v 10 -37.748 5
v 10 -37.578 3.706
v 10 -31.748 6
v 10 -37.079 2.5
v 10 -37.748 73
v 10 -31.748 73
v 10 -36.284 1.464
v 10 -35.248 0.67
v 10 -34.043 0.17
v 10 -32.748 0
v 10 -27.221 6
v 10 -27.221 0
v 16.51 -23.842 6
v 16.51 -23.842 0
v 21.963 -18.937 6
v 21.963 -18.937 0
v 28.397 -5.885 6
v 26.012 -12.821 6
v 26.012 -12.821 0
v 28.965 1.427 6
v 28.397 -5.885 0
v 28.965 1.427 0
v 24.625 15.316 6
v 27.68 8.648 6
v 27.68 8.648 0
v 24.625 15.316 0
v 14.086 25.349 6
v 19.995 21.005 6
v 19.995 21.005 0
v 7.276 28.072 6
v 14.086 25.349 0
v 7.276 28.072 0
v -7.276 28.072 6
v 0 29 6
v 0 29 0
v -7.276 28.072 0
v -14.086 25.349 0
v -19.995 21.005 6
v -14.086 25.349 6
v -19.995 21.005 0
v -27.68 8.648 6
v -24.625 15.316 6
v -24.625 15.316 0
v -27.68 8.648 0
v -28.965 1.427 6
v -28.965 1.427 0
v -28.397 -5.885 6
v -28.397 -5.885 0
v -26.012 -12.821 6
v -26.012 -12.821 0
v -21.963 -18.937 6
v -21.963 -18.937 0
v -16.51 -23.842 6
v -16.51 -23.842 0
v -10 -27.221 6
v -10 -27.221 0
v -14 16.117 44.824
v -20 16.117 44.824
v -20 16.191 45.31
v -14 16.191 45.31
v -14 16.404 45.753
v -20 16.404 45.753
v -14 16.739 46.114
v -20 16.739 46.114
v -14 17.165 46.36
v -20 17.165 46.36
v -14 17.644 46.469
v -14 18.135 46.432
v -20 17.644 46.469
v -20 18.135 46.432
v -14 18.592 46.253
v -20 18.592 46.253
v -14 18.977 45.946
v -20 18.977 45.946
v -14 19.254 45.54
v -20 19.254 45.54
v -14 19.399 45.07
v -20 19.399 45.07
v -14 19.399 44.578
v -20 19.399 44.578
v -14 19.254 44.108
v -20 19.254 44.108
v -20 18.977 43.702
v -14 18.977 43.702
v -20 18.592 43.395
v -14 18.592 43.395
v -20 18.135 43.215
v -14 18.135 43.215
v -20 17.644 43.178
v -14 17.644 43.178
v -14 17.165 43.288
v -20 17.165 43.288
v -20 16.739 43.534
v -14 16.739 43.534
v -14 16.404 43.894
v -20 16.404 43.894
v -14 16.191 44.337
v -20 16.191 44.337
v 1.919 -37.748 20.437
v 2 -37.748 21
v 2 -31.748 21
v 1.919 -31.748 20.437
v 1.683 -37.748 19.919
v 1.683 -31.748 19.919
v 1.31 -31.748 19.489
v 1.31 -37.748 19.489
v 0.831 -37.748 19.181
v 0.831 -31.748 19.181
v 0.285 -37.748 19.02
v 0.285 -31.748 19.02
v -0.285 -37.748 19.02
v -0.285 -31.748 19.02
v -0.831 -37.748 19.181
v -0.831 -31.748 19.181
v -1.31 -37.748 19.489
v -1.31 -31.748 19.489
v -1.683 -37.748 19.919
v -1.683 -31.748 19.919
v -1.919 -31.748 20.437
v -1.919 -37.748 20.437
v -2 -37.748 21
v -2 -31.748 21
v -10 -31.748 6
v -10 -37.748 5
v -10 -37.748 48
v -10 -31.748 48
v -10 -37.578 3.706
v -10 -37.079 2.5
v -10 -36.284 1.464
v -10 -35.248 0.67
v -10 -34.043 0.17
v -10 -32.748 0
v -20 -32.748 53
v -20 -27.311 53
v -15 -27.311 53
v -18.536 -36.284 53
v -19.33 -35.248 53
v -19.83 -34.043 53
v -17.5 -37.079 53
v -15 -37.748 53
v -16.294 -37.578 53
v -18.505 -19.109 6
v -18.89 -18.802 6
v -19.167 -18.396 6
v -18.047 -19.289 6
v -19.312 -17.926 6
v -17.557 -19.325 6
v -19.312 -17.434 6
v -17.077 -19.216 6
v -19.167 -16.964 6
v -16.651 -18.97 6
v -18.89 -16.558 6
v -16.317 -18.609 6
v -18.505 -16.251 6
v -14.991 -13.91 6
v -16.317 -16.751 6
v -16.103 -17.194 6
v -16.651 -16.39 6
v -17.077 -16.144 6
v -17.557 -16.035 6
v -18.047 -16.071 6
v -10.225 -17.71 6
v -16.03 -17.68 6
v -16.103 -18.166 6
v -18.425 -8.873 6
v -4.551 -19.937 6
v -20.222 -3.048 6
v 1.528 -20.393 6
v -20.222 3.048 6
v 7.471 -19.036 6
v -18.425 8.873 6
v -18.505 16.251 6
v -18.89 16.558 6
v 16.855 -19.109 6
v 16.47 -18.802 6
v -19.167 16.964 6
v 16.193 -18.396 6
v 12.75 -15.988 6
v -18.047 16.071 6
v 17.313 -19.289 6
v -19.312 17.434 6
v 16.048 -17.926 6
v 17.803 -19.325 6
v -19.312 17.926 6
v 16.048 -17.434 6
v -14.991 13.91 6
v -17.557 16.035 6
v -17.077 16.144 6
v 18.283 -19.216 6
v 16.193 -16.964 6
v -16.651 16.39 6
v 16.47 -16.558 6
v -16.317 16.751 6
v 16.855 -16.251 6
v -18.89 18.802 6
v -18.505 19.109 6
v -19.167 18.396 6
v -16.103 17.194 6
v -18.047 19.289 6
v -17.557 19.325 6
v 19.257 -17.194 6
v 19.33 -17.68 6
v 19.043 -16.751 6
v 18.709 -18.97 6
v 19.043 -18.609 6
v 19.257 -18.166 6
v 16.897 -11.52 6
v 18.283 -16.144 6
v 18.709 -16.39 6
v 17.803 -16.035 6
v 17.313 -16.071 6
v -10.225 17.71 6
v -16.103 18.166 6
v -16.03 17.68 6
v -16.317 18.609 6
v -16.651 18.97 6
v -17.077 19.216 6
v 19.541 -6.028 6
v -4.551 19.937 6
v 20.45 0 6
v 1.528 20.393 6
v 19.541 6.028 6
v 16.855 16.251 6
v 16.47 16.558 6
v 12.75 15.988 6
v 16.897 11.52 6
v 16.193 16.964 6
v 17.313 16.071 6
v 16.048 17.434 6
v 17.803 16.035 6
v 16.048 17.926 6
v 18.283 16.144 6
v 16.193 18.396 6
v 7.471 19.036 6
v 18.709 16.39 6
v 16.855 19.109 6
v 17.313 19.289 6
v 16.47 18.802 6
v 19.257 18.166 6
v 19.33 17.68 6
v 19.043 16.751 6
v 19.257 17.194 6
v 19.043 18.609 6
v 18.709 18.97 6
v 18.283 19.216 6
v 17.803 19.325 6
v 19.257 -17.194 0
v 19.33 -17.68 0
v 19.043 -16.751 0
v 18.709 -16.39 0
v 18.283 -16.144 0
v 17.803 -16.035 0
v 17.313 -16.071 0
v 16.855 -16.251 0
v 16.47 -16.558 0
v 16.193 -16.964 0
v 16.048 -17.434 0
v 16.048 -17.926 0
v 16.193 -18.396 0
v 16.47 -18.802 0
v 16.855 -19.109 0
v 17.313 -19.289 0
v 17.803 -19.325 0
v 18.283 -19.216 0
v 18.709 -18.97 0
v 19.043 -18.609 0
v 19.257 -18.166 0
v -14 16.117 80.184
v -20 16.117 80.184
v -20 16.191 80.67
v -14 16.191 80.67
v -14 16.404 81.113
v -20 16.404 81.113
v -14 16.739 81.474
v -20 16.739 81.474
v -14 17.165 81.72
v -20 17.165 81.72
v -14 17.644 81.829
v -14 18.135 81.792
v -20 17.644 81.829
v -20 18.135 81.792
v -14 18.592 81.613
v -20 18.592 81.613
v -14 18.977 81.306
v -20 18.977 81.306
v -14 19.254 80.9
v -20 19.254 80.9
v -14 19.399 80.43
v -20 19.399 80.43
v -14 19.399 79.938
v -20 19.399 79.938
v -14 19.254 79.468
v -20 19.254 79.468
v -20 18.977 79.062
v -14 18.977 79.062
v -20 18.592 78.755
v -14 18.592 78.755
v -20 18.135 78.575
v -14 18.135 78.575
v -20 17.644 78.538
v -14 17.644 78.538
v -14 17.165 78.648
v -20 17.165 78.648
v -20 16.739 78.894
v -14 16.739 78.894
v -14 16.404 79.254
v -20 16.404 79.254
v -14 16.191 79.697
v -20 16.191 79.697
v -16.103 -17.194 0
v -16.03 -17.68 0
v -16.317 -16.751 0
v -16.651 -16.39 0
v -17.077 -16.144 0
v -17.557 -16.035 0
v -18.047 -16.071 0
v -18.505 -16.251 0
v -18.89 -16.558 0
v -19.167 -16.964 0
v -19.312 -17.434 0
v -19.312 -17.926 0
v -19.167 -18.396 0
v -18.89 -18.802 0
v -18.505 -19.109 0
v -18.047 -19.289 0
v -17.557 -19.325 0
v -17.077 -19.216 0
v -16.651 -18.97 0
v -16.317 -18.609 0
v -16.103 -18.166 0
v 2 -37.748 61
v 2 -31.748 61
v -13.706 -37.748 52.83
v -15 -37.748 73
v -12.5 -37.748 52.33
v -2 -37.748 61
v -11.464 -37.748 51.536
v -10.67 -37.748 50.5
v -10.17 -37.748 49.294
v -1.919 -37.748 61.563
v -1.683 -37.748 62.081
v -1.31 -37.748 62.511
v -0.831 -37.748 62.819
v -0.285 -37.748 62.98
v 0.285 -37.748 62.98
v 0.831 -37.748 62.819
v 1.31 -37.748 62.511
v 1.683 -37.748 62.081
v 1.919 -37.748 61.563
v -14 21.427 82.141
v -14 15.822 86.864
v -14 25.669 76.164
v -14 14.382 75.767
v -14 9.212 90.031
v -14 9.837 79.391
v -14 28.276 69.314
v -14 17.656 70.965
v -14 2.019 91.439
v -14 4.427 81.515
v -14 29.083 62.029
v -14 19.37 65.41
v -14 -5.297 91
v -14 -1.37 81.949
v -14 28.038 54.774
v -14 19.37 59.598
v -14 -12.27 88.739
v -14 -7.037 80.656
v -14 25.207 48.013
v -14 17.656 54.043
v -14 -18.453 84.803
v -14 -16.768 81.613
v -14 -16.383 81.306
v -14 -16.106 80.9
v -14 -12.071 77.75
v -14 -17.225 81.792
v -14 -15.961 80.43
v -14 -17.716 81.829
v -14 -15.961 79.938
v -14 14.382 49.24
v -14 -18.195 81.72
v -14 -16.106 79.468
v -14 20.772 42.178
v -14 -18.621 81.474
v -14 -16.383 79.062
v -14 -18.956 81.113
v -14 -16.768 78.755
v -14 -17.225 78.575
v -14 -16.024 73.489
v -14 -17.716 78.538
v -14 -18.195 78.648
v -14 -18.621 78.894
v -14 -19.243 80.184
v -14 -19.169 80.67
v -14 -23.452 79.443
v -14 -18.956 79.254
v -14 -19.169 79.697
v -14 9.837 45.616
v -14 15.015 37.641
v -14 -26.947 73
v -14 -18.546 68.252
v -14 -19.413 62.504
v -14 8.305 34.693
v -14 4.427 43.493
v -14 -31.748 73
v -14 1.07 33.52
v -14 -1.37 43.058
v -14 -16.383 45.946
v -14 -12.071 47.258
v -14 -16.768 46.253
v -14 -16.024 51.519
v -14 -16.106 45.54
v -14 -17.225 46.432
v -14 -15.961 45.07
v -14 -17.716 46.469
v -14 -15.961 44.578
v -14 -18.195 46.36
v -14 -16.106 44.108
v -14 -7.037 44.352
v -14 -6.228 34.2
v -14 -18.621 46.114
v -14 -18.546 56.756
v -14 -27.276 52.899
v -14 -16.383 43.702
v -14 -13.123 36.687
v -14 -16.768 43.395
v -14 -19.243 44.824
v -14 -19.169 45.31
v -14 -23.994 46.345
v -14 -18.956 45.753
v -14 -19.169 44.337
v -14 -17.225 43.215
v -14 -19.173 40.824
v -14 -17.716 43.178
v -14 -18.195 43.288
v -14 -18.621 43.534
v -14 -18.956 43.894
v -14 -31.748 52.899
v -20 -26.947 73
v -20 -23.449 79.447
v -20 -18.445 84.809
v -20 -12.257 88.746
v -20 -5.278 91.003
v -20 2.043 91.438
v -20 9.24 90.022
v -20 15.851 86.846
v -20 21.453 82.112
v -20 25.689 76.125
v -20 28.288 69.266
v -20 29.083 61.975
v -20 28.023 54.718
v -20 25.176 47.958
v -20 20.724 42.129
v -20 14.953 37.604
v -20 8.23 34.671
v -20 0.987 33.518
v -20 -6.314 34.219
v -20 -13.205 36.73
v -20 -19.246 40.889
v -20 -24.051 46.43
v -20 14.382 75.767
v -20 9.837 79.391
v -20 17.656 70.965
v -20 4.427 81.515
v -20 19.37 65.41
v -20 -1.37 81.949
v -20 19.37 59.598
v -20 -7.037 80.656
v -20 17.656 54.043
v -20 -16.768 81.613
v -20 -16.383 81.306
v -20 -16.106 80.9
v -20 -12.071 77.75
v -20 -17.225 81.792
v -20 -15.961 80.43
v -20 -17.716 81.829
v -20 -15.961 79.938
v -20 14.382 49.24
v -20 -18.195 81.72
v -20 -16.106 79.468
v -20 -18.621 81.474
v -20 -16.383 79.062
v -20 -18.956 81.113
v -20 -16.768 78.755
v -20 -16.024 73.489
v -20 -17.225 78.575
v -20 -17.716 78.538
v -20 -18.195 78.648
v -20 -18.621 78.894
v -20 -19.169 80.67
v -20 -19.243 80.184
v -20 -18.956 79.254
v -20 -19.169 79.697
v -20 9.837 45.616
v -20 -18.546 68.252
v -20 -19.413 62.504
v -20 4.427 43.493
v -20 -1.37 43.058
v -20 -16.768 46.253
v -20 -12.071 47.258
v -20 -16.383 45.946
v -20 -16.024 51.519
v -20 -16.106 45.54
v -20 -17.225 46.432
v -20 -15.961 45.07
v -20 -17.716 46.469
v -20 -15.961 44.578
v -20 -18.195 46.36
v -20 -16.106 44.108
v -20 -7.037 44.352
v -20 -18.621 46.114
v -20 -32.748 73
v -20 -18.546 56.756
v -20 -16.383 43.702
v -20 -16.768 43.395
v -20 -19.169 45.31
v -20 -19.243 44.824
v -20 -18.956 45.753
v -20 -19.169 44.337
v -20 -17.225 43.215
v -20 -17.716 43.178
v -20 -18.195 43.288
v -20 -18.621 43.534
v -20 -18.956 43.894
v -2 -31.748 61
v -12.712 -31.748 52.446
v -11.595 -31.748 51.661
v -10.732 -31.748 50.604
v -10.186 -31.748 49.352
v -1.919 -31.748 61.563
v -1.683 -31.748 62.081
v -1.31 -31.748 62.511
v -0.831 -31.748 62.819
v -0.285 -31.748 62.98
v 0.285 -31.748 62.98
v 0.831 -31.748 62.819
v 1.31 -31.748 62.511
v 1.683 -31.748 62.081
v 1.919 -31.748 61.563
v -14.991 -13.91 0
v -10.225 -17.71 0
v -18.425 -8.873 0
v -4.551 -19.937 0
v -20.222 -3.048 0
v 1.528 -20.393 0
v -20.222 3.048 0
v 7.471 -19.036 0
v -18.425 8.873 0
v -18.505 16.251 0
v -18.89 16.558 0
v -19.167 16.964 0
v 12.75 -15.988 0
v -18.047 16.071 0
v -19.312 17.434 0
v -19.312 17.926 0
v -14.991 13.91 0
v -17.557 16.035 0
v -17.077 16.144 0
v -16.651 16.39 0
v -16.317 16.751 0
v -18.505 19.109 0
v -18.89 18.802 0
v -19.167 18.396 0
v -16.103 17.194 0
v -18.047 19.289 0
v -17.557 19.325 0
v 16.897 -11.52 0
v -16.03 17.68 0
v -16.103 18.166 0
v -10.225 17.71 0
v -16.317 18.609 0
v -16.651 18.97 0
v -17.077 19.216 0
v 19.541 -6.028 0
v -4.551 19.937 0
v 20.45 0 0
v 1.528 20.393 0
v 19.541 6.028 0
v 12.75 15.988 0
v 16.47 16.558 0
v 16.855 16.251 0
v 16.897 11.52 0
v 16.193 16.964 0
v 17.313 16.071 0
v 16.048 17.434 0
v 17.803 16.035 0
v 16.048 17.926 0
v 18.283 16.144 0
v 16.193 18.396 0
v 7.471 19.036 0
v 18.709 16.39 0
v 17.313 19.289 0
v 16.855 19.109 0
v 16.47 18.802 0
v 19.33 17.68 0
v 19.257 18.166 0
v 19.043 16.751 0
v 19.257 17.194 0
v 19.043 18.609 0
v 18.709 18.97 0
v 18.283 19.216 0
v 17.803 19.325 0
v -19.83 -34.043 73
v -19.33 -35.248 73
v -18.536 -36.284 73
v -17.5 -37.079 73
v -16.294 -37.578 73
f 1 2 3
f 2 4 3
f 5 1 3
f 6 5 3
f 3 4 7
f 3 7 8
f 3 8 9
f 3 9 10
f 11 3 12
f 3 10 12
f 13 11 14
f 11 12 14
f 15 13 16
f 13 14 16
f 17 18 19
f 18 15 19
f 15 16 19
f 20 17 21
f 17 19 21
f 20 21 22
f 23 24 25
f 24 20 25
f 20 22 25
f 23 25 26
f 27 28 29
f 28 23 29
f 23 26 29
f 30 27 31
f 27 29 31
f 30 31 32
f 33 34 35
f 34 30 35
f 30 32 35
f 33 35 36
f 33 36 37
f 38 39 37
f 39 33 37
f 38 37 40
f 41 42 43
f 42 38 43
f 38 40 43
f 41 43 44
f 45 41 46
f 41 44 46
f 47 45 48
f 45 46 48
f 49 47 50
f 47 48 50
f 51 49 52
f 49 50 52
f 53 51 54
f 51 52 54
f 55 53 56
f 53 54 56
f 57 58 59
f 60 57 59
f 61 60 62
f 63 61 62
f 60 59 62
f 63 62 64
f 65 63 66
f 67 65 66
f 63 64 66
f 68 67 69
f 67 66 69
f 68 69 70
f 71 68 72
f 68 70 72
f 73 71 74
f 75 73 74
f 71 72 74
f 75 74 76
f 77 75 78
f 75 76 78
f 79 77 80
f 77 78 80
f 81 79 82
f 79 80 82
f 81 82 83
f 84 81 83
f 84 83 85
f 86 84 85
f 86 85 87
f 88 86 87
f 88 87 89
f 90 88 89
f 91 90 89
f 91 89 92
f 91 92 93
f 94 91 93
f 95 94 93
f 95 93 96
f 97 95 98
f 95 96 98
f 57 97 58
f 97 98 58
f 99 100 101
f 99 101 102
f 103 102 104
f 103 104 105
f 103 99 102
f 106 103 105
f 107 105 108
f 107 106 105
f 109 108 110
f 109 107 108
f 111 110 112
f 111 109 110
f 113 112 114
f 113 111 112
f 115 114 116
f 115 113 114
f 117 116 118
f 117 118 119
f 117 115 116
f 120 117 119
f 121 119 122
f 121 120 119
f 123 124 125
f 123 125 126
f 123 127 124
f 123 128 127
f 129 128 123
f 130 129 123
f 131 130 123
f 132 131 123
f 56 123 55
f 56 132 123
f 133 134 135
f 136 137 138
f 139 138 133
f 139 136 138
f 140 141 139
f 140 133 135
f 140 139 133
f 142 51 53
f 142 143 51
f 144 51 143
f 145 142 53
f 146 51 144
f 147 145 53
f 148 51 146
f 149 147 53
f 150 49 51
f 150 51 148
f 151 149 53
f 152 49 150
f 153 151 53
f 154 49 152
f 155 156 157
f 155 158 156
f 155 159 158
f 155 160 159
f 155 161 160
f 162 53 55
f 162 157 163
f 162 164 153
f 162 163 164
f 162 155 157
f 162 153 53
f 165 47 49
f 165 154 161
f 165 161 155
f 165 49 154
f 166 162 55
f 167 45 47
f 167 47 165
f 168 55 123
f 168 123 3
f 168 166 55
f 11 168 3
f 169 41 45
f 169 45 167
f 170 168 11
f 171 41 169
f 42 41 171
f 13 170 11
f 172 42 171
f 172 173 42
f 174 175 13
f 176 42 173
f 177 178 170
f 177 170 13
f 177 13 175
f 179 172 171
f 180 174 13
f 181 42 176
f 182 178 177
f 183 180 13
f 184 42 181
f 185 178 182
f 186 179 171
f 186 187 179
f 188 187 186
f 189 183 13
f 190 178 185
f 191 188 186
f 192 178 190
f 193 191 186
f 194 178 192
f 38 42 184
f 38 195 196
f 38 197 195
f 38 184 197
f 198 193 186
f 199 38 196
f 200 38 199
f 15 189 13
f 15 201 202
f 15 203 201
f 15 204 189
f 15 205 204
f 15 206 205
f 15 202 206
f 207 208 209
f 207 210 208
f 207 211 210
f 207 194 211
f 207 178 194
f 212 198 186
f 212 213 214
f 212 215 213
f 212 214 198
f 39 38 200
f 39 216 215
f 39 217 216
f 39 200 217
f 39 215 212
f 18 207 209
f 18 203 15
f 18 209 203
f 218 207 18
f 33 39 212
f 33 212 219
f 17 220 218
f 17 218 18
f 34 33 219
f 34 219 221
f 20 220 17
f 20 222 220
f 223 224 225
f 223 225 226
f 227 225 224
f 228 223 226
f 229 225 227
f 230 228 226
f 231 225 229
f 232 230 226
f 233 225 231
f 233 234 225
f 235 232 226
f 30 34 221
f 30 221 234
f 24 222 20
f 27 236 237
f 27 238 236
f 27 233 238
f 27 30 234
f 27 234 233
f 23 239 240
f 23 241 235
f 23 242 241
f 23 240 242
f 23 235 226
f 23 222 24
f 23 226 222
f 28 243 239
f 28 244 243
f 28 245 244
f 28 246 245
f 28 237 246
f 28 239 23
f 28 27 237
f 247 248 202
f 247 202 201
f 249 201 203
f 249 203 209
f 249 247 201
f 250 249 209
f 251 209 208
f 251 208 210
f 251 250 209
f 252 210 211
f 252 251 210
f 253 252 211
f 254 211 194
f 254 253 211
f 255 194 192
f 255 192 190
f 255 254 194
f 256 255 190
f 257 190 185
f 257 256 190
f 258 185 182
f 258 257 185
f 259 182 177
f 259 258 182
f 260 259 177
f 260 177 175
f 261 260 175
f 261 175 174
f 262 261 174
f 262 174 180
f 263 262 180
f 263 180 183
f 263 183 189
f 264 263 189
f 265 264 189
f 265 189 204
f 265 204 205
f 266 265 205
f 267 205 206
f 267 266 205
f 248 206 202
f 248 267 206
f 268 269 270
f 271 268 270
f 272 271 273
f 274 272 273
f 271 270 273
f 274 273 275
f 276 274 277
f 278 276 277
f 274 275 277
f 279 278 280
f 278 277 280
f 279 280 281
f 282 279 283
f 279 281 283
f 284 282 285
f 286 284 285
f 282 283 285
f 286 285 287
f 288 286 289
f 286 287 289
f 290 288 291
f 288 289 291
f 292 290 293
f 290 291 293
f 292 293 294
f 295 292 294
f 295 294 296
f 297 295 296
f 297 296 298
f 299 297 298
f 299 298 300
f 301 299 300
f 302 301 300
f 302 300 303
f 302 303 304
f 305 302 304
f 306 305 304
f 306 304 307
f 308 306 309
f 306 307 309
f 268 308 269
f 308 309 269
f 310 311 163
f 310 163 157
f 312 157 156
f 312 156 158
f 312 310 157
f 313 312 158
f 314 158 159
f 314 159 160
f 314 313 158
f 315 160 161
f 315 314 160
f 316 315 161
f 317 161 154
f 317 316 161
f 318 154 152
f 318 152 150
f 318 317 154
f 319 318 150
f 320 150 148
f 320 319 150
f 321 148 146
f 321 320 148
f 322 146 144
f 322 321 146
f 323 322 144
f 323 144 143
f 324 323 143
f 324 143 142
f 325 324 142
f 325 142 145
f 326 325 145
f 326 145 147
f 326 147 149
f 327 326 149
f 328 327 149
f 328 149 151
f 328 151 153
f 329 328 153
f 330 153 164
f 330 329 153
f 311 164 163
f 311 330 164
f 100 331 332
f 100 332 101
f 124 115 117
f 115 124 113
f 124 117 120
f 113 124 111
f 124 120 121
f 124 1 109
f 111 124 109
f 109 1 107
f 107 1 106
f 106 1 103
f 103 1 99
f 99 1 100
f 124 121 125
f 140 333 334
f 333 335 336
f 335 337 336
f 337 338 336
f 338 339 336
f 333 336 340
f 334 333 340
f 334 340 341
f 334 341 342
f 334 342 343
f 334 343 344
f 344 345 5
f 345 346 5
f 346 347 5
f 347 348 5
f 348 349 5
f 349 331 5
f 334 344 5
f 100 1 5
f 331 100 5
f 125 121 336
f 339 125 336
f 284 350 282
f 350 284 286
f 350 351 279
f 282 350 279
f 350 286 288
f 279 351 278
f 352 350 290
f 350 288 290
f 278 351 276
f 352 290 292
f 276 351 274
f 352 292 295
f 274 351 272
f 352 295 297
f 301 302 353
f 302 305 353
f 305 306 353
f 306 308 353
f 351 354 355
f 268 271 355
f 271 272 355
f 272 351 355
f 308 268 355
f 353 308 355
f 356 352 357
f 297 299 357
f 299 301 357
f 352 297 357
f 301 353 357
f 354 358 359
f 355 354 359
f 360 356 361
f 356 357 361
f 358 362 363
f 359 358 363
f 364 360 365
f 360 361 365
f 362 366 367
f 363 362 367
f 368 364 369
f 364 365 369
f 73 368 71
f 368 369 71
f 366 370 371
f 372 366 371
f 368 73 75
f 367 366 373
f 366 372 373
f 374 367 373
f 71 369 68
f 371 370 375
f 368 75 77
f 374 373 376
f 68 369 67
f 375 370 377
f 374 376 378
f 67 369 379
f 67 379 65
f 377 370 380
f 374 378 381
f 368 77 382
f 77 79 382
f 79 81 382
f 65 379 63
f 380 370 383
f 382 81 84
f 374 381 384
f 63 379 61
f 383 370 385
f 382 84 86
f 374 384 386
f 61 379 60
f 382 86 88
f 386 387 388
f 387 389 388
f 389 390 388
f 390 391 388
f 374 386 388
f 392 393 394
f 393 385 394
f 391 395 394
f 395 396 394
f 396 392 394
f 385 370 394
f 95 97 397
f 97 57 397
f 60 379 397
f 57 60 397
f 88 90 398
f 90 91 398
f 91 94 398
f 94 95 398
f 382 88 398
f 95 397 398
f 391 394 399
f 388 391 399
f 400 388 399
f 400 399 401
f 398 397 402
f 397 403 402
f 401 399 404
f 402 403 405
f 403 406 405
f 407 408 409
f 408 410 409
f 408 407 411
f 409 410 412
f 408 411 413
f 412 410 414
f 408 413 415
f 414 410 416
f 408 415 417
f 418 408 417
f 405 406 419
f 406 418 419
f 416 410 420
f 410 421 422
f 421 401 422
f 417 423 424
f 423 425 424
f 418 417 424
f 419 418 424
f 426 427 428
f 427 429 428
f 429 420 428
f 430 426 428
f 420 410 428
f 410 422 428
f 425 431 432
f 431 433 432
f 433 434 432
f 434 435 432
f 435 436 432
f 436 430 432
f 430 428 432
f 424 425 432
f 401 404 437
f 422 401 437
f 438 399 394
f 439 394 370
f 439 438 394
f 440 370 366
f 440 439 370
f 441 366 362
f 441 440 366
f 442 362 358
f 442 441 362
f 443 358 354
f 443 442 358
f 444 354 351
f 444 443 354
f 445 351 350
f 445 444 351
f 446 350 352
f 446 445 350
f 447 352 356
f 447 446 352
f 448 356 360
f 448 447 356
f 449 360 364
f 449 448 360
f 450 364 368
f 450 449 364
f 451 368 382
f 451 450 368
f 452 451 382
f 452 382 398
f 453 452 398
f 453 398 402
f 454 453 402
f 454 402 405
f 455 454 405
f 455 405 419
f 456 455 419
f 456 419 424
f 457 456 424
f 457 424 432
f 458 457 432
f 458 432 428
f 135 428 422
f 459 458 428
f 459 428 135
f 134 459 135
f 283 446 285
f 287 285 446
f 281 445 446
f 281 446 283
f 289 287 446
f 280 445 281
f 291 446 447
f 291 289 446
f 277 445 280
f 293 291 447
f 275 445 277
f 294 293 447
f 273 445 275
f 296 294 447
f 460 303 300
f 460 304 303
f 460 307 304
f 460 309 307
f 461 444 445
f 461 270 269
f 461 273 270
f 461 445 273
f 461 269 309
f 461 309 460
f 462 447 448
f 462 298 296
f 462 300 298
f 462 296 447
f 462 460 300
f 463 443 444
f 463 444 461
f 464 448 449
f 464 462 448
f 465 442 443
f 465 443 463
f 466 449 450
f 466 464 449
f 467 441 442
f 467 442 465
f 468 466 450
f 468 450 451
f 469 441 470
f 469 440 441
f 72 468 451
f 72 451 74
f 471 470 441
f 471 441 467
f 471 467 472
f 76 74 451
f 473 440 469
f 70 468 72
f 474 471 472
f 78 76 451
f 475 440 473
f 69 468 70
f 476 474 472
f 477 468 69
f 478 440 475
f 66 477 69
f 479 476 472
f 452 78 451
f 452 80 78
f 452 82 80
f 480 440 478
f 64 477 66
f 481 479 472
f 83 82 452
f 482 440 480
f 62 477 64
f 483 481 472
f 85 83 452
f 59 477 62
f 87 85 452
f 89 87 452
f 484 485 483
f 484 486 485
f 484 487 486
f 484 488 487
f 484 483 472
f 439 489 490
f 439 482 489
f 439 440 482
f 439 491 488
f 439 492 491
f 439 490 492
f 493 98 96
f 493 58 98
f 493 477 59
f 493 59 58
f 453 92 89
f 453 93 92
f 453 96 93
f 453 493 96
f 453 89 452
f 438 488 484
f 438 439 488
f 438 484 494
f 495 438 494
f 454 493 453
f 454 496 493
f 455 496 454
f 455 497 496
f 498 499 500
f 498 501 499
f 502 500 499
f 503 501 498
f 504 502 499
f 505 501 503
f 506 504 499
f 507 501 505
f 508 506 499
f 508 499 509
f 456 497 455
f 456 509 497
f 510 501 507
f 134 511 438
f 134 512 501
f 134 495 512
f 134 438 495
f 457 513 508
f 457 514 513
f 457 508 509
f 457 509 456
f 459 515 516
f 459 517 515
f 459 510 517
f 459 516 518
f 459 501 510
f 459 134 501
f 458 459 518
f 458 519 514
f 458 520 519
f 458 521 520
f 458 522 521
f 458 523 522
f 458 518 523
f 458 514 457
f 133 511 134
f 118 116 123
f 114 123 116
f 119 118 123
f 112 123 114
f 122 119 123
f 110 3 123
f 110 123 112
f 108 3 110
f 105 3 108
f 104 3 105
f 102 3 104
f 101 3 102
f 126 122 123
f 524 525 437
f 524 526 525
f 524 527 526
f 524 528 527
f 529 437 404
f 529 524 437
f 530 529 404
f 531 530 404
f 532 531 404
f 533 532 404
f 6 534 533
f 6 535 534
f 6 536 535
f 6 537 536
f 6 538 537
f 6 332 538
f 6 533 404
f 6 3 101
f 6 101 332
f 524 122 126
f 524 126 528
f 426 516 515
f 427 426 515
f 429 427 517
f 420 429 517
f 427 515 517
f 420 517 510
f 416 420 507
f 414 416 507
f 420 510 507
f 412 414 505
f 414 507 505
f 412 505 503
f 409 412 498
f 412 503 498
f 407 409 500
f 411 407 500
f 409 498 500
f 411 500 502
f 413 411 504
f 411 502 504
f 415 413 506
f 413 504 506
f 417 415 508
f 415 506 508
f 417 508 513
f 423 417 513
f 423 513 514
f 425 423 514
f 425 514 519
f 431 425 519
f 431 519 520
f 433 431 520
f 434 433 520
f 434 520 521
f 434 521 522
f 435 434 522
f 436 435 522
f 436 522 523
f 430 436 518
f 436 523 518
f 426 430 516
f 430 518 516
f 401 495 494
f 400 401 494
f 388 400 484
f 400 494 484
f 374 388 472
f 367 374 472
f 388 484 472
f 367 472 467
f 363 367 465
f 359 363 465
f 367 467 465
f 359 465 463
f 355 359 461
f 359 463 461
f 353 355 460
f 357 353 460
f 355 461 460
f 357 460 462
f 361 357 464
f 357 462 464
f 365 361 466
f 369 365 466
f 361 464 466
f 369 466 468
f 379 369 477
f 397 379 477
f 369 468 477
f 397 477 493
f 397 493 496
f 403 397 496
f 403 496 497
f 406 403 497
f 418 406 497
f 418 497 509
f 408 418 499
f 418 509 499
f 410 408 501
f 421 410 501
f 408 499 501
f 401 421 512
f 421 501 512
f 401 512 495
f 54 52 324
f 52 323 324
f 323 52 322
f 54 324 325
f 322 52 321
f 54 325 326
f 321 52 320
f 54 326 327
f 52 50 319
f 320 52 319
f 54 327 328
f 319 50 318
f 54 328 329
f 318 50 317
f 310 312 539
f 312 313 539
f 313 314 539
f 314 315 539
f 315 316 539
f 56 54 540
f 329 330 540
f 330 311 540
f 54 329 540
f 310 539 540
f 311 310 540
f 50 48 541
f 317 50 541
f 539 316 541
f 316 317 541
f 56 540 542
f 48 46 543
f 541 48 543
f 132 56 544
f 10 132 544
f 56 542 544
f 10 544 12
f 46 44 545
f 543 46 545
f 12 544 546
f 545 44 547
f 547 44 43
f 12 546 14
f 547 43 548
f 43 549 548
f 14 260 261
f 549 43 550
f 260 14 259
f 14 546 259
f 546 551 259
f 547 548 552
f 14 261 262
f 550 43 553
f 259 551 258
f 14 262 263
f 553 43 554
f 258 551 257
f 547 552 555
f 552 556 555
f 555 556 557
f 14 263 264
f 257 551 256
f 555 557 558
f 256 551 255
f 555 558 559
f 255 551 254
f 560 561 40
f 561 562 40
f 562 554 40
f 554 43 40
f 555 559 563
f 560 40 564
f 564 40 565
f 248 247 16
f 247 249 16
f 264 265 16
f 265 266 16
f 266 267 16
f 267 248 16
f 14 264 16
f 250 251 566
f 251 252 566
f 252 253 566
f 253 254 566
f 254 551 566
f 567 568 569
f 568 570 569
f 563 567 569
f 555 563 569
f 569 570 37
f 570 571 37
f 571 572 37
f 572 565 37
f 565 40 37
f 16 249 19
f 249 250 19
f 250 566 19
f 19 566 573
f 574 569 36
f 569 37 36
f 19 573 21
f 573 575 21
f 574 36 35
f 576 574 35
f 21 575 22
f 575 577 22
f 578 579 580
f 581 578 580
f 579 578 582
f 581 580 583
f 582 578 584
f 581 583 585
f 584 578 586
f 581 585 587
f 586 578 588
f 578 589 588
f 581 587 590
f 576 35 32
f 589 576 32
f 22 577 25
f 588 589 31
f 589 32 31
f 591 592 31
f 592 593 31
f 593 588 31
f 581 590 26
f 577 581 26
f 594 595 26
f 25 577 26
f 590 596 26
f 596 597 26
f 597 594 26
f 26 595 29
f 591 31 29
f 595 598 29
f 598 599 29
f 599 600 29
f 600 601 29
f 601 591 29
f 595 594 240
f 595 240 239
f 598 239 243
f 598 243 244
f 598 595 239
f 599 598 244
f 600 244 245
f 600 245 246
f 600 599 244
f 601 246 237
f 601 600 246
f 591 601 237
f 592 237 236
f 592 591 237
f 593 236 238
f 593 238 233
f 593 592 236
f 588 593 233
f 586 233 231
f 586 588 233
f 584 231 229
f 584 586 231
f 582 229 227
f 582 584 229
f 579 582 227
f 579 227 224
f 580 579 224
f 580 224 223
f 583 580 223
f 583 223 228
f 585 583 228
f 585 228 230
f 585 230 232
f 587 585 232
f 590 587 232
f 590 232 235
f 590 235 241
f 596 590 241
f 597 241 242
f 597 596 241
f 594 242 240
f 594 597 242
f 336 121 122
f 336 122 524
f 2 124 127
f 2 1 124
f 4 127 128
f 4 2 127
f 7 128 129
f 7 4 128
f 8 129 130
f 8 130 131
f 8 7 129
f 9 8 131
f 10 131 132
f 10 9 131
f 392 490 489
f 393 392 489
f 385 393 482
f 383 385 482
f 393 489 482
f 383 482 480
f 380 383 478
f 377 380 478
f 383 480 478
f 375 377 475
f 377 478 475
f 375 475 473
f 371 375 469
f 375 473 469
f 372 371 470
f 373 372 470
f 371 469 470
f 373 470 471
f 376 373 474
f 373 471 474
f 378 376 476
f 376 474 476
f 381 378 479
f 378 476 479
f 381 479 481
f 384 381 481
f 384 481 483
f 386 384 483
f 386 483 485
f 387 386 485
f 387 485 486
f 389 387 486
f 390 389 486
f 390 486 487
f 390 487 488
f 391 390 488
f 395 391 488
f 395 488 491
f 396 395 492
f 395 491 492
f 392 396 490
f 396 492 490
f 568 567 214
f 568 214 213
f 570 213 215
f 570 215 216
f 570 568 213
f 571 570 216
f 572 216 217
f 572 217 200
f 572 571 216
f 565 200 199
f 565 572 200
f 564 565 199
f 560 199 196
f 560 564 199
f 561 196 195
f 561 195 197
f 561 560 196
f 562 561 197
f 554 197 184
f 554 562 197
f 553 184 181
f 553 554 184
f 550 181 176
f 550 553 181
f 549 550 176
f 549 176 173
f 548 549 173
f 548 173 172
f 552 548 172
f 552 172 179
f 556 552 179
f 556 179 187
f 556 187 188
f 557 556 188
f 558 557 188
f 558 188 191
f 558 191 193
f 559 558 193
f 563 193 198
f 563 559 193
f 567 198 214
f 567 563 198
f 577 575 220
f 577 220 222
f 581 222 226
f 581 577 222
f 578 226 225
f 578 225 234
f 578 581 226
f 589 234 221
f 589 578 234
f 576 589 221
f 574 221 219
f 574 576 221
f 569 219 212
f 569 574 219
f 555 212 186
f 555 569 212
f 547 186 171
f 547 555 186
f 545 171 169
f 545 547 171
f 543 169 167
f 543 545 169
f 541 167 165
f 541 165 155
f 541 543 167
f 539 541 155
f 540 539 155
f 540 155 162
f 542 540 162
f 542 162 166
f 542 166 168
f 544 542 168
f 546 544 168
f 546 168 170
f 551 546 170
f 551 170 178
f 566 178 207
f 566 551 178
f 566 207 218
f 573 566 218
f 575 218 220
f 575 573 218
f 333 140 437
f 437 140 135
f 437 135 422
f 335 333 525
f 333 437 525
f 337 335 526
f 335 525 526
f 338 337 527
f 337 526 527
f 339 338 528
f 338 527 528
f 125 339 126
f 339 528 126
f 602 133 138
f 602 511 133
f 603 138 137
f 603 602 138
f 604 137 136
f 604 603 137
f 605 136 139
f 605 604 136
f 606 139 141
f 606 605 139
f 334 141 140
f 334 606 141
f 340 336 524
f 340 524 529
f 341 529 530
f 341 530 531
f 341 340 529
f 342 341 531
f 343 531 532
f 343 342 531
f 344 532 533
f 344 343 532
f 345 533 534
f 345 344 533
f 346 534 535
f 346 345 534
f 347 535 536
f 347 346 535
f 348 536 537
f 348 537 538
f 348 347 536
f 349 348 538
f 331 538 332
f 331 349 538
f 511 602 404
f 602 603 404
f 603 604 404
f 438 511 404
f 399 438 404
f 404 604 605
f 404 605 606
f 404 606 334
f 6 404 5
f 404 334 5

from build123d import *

# Parameters (mm, degrees)
SKETCH1_R           = 29
SKETCH1_R_2         = 20.45
SKETCH1_R_3         = 1.65
BOSS_EXTRUDE1_DEPTH = 6
BOSS_EXTRUDE3_DEPTH = 6
SKETCH4_W           = 20
SKETCH4_H           = 6
BOSS_EXTRUDE4_DEPTH = 67
SKETCH5_W           = 20
SKETCH5_H           = 6
BOSS_EXTRUDE5_DEPTH = 10
SKETCH7_R           = 29
SKETCH7_R_2         = 1.65
SKETCH7_R_3         = 19.5
BOSS_EXTRUDE6_DEPTH = 6
SKETCH8_W           = 6
SKETCH8_H           = 20
BOSS_EXTRUDE8_DEPTH = 6
CUT_EXTRUDE1_DEPTH  = 6
FILLET1_R           = 5
FILLET2_R           = 5


with BuildPart() as part:
    # Sketch1 → Boss-Extrude1 (new body)
    with BuildSketch(Plane.XY):
        Circle(SKETCH1_R)
        Circle(SKETCH1_R_2, mode=Mode.SUBTRACT)
        with Locations((17.68, -17.68)):
            Circle(SKETCH1_R_3, mode=Mode.SUBTRACT)
        with Locations((-17.68, -17.68)):
            Circle(SKETCH1_R_3, mode=Mode.SUBTRACT)
        with Locations((-17.68, 17.68)):
            Circle(SKETCH1_R_3, mode=Mode.SUBTRACT)
        with Locations((17.68, 17.68)):
            Circle(SKETCH1_R_3, mode=Mode.SUBTRACT)
    extrude(amount=BOSS_EXTRUDE1_DEPTH)

    # Sketch3 → Boss-Extrude3 (add)
    with BuildSketch(Plane.XY.offset(6)):
        Polygon((0, -25.748471389), (-10, -25.748471389), (-10, -37.748471389), (10, -37.748471389), (10, -25.748471389), align=None)
    extrude(amount=-BOSS_EXTRUDE3_DEPTH)

    # Sketch4 → Boss-Extrude4 (add)
    with BuildSketch(Plane.XY.offset(6)):
        with Locations((0, -34.748471389)):
            Rectangle(SKETCH4_W, SKETCH4_H)
    extrude(amount=BOSS_EXTRUDE4_DEPTH)

    # Sketch5 → Boss-Extrude5 (add)
    with BuildSketch(Plane.ZY.offset(10)):
        with Locations((63, -34.748471389)):
            Rectangle(SKETCH5_W, SKETCH5_H)
    extrude(amount=BOSS_EXTRUDE5_DEPTH)



with BuildPart() as body_2:
    # Sketch7 → Boss-Extrude6 (new body)
    with BuildSketch(Plane.ZY.offset(20)):
        with Locations(Location((62.50384549, 0.087350514, 0), (0, 0, 270))):
            Circle(SKETCH7_R)
        with Locations(Location((80.18384549, -17.592649486, 0), (0, 0, 270))):
            Circle(SKETCH7_R_2, mode=Mode.SUBTRACT)
        with Locations(Location((44.82384549, -17.592649486, 0), (0, 0, 270))):
            Circle(SKETCH7_R_2, mode=Mode.SUBTRACT)
        with Locations(Location((44.82384549, 17.767350514, 0), (0, 0, 270))):
            Circle(SKETCH7_R_2, mode=Mode.SUBTRACT)
        with Locations(Location((80.18384549, 17.767350514, 0), (0, 0, 270))):
            Circle(SKETCH7_R_2, mode=Mode.SUBTRACT)
        with Locations(Location((62.50384549, 0.087350514, 0), (0, 0, 270))):
            Circle(SKETCH7_R_3, mode=Mode.SUBTRACT)
    extrude(amount=-BOSS_EXTRUDE6_DEPTH)


with BuildPart() as part_1:
    add(part.part)

    add(body_2.part)  # Boss-Extrude8 merges body 2
    # Sketch8 → Boss-Extrude8 (add)
    with BuildSketch(Plane(origin=(0, -31.748471389, 0), x_dir=(1, 0, 0), z_dir=(0, 1, 0))):
        with Locations((-17, -63)):
            Rectangle(SKETCH8_W, SKETCH8_H)
    extrude(amount=BOSS_EXTRUDE8_DEPTH)

    # Sketch9 → Cut-Extrude1 (cut)
    with BuildSketch(Plane.XZ.offset(37.748471389)):
        with BuildLine():
            Line((2, 61), (2, 21))
            ThreePointArc((2, 21), (0, 19), (-2, 21))
            Line((-2, 21), (-2, 61))
            ThreePointArc((-2, 61), (0, 63), (2, 61))
        make_face()
    extrude(amount=-CUT_EXTRUDE1_DEPTH, mode=Mode.SUBTRACT)

    # Fillet1
    fillet1_edges = [part_1.edges().sort_by_distance(p)[0] for p in [
        (0, -37.748471389, 0),
        (-20, -37.748471389, 63),
    ]]
    fillet(fillet1_edges, radius=FILLET1_R)

    # Fillet2
    fillet2_edges = [part_1.edges().sort_by_distance(p)[0] for p in [
        (-10, -34.748471389, 53),
    ]]
    fillet(fillet2_edges, radius=FILLET2_R)


solid = part_1.part
